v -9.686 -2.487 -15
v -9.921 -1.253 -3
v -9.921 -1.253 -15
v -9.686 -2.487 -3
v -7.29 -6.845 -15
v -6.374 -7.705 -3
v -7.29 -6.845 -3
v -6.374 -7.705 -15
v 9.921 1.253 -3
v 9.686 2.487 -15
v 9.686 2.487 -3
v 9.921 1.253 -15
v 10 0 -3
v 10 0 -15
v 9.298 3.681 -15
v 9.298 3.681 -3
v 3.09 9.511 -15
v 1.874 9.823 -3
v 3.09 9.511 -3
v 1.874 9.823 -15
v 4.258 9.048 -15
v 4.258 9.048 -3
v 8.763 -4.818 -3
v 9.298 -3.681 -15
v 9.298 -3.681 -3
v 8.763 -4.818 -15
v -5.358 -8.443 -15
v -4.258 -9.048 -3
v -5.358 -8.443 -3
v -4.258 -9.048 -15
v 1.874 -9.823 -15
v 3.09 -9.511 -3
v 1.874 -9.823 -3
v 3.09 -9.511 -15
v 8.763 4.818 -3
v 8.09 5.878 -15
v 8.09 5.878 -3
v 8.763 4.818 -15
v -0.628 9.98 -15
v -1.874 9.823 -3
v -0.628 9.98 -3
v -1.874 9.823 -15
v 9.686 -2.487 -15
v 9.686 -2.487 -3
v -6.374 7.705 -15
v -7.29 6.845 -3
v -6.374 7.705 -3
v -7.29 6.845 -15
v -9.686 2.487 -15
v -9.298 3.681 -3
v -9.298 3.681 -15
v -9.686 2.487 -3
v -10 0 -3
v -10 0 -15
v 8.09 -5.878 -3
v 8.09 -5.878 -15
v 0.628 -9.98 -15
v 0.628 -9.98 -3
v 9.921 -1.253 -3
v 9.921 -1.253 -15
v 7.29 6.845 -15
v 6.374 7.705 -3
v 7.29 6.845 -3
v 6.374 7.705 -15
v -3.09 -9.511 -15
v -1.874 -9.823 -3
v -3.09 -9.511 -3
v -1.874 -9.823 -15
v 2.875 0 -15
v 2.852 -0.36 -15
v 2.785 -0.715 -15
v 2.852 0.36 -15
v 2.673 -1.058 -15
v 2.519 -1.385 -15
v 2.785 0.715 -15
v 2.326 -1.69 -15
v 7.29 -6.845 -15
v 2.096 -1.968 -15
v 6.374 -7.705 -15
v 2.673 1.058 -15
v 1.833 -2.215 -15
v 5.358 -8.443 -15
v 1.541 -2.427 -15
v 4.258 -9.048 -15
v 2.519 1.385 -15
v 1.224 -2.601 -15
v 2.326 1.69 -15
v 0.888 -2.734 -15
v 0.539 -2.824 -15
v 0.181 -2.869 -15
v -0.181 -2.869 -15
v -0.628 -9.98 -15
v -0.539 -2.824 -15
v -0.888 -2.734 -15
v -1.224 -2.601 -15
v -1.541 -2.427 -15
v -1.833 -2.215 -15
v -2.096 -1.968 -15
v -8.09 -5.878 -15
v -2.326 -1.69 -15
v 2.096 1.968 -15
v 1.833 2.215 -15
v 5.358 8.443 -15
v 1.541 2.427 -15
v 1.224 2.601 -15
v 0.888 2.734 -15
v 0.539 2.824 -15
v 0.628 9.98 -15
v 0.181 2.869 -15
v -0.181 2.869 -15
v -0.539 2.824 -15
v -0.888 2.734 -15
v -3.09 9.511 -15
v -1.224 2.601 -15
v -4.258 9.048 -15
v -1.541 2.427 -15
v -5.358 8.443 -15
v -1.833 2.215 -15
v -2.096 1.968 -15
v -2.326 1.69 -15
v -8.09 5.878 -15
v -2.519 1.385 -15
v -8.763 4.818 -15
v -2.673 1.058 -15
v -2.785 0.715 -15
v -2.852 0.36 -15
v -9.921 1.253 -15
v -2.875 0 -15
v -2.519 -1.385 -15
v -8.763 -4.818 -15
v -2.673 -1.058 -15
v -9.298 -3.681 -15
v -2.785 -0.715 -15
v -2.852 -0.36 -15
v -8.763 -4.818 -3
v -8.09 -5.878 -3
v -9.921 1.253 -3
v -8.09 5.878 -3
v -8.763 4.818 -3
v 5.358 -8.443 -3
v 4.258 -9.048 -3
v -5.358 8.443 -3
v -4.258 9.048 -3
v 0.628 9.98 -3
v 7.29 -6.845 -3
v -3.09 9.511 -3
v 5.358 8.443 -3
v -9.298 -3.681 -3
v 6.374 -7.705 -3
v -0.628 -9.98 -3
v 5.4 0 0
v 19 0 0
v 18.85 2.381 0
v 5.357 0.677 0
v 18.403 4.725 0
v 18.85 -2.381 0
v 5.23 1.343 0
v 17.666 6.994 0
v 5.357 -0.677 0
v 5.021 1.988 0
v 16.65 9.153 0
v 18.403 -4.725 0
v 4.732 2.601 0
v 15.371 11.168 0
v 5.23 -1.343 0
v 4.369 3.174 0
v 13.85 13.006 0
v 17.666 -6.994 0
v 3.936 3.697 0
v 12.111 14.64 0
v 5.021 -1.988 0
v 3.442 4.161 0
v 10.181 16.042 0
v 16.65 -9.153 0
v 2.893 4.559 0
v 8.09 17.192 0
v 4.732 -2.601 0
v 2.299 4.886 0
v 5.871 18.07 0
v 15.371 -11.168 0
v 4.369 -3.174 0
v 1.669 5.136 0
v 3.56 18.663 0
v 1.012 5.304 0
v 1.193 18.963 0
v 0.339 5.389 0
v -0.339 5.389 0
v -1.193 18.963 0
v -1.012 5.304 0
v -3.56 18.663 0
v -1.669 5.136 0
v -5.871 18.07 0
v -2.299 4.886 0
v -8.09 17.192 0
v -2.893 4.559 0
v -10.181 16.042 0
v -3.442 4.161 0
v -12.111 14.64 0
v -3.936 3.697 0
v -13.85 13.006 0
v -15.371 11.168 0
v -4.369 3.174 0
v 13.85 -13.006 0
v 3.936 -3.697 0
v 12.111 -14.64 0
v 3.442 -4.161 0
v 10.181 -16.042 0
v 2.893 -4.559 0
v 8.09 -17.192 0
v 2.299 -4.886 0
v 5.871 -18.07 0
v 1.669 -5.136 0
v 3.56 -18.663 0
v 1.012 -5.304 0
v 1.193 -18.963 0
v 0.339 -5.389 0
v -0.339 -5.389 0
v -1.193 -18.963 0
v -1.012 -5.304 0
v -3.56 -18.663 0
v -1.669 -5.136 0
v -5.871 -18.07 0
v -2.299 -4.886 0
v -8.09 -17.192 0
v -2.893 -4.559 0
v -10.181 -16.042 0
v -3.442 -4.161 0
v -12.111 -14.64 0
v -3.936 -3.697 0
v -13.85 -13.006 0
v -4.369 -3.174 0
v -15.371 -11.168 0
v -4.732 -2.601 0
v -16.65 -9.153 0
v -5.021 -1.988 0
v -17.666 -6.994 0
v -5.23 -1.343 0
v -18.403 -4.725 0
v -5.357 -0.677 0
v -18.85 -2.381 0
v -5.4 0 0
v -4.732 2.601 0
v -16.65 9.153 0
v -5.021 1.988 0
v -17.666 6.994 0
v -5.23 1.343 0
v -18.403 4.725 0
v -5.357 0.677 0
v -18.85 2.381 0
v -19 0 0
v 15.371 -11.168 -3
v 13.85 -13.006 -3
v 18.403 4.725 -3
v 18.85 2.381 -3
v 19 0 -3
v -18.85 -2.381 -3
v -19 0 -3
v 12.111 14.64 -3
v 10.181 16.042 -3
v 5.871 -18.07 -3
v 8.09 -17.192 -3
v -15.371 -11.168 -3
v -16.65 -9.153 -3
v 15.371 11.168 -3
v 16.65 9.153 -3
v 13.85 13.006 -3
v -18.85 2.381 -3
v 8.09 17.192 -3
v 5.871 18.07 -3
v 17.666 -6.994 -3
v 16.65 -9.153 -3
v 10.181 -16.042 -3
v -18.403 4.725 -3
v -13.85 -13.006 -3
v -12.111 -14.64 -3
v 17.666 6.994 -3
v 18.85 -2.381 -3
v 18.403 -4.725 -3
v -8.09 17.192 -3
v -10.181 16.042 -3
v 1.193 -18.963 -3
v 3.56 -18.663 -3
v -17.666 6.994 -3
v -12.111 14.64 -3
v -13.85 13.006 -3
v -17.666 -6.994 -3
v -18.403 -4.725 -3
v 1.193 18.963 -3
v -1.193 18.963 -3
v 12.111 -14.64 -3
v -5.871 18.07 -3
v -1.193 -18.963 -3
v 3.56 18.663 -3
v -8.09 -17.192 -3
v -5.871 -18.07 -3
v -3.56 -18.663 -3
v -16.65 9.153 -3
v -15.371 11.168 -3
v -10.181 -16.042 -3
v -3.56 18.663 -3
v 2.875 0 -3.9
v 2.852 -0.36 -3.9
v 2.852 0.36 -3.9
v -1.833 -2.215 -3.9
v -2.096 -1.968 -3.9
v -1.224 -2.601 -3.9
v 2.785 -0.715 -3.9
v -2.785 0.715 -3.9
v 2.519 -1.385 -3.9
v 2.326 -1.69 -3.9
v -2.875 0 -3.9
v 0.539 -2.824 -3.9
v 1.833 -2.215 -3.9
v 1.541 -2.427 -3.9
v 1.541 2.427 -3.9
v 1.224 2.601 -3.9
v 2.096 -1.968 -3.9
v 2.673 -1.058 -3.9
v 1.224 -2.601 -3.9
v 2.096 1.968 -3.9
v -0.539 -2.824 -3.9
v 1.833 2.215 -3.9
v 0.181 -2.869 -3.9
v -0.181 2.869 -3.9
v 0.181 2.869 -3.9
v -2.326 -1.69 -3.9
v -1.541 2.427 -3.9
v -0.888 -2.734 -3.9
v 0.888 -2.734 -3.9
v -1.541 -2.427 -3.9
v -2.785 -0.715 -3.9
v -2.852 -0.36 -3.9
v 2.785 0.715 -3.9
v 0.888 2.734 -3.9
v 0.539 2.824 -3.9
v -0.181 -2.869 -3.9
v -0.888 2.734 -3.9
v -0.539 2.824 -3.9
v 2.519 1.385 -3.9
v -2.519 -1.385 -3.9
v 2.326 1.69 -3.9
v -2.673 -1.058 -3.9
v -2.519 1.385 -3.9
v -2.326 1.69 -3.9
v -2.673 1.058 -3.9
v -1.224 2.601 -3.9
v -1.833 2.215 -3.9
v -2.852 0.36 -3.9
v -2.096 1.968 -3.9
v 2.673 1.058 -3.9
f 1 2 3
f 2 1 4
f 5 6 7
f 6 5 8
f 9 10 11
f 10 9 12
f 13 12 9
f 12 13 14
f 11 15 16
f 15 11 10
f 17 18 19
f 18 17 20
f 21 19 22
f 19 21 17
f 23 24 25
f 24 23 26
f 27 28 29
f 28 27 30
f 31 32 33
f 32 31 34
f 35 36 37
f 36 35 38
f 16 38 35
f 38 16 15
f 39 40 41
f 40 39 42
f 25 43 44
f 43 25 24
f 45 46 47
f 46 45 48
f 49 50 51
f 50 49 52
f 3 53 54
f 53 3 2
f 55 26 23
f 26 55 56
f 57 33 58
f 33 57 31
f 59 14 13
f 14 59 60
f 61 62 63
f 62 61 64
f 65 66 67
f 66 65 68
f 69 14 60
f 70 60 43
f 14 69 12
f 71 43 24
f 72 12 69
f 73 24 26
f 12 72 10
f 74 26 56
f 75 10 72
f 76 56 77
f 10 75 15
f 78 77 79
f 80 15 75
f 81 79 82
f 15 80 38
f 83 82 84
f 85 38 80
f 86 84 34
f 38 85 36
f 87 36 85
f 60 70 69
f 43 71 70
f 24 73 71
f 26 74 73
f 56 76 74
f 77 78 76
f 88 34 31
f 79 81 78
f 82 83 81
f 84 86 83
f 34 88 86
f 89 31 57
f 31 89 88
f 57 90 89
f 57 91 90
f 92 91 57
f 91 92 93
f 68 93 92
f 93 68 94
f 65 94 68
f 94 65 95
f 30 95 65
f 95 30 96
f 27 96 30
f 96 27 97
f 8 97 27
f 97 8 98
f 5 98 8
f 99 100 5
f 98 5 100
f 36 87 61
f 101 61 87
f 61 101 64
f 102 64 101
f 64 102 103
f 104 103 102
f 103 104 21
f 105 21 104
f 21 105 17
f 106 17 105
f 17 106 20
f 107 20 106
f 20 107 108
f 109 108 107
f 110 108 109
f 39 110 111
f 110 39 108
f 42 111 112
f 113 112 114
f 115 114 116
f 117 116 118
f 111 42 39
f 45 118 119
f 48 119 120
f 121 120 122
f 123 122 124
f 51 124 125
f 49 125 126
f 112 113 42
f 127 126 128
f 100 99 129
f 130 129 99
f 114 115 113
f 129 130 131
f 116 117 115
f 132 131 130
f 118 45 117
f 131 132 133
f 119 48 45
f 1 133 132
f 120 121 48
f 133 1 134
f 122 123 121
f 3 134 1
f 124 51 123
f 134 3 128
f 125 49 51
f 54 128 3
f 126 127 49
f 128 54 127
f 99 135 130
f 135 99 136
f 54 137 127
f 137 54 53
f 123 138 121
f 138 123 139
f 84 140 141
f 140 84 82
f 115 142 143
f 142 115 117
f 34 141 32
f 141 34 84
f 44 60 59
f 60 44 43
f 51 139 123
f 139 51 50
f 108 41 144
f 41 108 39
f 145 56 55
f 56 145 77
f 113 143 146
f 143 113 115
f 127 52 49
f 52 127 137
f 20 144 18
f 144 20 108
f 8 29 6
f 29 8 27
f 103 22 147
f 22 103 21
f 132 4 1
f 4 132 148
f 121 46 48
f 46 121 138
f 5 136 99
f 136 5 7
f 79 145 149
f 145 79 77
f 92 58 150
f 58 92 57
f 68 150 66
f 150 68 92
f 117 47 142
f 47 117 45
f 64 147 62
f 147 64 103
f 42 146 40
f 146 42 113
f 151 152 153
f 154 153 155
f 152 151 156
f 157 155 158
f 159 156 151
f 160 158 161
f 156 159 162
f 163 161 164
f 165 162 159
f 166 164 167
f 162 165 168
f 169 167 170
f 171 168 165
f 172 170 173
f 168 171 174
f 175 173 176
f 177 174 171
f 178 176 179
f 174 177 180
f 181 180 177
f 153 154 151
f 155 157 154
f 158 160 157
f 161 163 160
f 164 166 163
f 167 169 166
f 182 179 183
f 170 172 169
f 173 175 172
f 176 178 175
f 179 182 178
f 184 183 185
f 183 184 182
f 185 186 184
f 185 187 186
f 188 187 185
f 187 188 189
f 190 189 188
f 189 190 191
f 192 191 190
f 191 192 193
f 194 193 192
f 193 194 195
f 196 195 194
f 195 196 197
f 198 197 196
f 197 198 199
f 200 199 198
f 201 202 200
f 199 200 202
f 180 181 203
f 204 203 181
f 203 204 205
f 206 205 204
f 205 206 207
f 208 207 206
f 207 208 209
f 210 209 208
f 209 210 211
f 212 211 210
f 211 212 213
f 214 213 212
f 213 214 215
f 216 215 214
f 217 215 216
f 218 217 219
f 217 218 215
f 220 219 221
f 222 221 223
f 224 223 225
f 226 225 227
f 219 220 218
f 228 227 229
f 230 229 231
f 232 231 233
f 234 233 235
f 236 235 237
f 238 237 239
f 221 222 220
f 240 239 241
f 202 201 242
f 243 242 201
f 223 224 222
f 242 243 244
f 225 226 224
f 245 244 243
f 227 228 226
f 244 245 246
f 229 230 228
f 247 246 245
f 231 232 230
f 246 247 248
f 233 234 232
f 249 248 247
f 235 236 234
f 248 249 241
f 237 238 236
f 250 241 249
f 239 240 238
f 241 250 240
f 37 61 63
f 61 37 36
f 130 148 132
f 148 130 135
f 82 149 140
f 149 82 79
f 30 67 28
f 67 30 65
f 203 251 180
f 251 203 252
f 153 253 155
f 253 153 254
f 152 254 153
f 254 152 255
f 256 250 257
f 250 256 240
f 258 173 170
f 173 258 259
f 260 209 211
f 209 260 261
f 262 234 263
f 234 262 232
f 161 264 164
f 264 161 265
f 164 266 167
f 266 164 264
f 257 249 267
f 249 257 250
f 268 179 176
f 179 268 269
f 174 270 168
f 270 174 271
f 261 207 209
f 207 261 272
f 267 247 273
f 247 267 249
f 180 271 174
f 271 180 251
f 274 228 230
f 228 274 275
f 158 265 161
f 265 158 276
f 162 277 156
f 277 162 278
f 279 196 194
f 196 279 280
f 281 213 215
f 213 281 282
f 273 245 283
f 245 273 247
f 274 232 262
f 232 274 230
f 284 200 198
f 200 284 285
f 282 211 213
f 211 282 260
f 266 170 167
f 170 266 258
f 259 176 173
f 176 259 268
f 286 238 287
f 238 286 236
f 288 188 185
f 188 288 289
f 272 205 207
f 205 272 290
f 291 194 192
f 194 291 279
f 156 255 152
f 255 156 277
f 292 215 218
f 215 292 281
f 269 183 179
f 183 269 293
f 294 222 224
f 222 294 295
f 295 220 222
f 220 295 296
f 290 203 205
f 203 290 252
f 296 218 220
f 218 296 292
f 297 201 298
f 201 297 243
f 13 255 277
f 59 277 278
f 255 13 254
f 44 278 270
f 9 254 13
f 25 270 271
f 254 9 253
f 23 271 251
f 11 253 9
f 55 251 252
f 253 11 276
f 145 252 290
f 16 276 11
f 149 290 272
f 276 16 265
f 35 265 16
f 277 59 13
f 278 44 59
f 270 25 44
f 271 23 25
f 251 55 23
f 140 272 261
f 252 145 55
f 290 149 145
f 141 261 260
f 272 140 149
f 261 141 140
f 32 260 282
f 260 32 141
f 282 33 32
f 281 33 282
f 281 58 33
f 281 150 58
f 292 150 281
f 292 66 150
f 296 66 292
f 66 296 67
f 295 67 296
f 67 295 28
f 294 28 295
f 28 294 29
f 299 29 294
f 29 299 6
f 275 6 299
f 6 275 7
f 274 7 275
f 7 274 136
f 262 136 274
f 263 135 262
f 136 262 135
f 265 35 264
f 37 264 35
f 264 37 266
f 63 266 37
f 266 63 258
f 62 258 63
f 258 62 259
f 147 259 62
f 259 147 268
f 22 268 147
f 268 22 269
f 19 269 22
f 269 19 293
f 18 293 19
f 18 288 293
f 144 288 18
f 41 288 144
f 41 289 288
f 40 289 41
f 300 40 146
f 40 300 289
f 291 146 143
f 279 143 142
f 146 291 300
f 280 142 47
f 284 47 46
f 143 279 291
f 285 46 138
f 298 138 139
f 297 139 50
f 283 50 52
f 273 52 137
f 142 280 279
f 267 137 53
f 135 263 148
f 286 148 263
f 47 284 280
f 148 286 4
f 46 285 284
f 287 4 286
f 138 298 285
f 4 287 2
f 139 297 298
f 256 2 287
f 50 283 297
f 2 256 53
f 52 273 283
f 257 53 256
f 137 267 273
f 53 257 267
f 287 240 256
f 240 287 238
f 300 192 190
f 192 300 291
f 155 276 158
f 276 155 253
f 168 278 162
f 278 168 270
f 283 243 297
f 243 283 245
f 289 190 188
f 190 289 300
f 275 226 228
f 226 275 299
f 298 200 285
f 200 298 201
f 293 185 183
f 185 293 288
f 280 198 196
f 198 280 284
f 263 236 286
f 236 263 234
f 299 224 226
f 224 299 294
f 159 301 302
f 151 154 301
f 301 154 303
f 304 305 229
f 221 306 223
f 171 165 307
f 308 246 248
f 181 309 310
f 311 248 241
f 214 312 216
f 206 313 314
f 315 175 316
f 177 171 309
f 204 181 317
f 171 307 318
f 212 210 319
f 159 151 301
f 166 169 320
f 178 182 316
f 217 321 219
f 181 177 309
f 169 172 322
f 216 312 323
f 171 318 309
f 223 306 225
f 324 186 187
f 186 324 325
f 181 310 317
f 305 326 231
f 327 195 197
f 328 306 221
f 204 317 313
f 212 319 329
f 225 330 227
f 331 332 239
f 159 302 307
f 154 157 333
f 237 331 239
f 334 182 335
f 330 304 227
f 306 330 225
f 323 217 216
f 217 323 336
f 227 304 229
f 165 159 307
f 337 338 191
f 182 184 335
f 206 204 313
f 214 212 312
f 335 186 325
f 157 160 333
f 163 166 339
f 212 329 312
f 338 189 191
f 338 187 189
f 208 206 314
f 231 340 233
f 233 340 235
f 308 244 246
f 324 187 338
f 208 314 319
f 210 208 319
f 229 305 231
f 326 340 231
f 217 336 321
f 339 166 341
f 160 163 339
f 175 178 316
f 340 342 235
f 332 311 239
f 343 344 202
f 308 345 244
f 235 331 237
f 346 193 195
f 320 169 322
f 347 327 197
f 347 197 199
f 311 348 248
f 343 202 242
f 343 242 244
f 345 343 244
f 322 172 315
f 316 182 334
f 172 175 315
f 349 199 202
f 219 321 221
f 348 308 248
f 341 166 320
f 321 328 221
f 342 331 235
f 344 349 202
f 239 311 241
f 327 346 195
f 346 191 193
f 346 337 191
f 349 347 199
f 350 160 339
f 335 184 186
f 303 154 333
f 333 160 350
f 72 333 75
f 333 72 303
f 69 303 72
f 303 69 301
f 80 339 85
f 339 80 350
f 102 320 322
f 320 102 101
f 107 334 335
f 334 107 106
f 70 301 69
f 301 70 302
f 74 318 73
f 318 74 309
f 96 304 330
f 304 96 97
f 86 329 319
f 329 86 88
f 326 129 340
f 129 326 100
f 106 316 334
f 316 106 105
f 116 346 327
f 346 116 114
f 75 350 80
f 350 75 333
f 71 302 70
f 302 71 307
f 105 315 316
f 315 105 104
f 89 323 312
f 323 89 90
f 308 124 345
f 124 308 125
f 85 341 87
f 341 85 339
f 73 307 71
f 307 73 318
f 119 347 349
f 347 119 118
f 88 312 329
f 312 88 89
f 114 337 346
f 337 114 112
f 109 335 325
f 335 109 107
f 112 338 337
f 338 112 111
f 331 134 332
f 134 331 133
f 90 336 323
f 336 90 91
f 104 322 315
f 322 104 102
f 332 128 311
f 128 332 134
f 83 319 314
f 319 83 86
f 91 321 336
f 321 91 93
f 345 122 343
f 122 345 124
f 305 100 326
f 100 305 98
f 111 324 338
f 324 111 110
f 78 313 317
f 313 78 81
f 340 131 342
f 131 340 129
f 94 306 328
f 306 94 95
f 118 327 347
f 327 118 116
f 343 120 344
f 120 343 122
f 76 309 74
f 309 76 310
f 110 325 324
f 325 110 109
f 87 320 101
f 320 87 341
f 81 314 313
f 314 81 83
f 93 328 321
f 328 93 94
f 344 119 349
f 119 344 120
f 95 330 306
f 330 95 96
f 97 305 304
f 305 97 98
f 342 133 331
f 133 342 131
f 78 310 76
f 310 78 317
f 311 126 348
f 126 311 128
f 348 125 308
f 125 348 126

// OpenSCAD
$fn = 50;


difference() {
	union() {
		translate(v = [0, 0, -15.0000000000]) {
			cylinder(h = 15, r = 10.0000000000);
		}
		translate(v = [0, 0, -3.0000000000]) {
			cylinder(h = 3, r = 19.0000000000);
		}
	}
	union() {
		translate(v = [0, 0, 0]) {
			rotate(a = [0, 0, 0]) {
				difference() {
					union() {
						#translate(v = [0, 0, -15.0000000000]) {
							cylinder(h = 15, r = 2.6000000000);
						}
						#translate(v = [0, 0, -3.9000000000]) {
							cylinder(h = 3.9000000000, r = 10.0000000000, r1 = 2.8750000000, r2 = 5.4000000000);
						}
						#translate(v = [0, 0, -15.0000000000]) {
							cylinder(h = 15, r = 2.8750000000);
						}
						#translate(v = [0, 0, -15.0000000000]) {
							cylinder(h = 15, r = 2.6000000000);
						}
					}
					union();
				}
			}
		}
	}
}
